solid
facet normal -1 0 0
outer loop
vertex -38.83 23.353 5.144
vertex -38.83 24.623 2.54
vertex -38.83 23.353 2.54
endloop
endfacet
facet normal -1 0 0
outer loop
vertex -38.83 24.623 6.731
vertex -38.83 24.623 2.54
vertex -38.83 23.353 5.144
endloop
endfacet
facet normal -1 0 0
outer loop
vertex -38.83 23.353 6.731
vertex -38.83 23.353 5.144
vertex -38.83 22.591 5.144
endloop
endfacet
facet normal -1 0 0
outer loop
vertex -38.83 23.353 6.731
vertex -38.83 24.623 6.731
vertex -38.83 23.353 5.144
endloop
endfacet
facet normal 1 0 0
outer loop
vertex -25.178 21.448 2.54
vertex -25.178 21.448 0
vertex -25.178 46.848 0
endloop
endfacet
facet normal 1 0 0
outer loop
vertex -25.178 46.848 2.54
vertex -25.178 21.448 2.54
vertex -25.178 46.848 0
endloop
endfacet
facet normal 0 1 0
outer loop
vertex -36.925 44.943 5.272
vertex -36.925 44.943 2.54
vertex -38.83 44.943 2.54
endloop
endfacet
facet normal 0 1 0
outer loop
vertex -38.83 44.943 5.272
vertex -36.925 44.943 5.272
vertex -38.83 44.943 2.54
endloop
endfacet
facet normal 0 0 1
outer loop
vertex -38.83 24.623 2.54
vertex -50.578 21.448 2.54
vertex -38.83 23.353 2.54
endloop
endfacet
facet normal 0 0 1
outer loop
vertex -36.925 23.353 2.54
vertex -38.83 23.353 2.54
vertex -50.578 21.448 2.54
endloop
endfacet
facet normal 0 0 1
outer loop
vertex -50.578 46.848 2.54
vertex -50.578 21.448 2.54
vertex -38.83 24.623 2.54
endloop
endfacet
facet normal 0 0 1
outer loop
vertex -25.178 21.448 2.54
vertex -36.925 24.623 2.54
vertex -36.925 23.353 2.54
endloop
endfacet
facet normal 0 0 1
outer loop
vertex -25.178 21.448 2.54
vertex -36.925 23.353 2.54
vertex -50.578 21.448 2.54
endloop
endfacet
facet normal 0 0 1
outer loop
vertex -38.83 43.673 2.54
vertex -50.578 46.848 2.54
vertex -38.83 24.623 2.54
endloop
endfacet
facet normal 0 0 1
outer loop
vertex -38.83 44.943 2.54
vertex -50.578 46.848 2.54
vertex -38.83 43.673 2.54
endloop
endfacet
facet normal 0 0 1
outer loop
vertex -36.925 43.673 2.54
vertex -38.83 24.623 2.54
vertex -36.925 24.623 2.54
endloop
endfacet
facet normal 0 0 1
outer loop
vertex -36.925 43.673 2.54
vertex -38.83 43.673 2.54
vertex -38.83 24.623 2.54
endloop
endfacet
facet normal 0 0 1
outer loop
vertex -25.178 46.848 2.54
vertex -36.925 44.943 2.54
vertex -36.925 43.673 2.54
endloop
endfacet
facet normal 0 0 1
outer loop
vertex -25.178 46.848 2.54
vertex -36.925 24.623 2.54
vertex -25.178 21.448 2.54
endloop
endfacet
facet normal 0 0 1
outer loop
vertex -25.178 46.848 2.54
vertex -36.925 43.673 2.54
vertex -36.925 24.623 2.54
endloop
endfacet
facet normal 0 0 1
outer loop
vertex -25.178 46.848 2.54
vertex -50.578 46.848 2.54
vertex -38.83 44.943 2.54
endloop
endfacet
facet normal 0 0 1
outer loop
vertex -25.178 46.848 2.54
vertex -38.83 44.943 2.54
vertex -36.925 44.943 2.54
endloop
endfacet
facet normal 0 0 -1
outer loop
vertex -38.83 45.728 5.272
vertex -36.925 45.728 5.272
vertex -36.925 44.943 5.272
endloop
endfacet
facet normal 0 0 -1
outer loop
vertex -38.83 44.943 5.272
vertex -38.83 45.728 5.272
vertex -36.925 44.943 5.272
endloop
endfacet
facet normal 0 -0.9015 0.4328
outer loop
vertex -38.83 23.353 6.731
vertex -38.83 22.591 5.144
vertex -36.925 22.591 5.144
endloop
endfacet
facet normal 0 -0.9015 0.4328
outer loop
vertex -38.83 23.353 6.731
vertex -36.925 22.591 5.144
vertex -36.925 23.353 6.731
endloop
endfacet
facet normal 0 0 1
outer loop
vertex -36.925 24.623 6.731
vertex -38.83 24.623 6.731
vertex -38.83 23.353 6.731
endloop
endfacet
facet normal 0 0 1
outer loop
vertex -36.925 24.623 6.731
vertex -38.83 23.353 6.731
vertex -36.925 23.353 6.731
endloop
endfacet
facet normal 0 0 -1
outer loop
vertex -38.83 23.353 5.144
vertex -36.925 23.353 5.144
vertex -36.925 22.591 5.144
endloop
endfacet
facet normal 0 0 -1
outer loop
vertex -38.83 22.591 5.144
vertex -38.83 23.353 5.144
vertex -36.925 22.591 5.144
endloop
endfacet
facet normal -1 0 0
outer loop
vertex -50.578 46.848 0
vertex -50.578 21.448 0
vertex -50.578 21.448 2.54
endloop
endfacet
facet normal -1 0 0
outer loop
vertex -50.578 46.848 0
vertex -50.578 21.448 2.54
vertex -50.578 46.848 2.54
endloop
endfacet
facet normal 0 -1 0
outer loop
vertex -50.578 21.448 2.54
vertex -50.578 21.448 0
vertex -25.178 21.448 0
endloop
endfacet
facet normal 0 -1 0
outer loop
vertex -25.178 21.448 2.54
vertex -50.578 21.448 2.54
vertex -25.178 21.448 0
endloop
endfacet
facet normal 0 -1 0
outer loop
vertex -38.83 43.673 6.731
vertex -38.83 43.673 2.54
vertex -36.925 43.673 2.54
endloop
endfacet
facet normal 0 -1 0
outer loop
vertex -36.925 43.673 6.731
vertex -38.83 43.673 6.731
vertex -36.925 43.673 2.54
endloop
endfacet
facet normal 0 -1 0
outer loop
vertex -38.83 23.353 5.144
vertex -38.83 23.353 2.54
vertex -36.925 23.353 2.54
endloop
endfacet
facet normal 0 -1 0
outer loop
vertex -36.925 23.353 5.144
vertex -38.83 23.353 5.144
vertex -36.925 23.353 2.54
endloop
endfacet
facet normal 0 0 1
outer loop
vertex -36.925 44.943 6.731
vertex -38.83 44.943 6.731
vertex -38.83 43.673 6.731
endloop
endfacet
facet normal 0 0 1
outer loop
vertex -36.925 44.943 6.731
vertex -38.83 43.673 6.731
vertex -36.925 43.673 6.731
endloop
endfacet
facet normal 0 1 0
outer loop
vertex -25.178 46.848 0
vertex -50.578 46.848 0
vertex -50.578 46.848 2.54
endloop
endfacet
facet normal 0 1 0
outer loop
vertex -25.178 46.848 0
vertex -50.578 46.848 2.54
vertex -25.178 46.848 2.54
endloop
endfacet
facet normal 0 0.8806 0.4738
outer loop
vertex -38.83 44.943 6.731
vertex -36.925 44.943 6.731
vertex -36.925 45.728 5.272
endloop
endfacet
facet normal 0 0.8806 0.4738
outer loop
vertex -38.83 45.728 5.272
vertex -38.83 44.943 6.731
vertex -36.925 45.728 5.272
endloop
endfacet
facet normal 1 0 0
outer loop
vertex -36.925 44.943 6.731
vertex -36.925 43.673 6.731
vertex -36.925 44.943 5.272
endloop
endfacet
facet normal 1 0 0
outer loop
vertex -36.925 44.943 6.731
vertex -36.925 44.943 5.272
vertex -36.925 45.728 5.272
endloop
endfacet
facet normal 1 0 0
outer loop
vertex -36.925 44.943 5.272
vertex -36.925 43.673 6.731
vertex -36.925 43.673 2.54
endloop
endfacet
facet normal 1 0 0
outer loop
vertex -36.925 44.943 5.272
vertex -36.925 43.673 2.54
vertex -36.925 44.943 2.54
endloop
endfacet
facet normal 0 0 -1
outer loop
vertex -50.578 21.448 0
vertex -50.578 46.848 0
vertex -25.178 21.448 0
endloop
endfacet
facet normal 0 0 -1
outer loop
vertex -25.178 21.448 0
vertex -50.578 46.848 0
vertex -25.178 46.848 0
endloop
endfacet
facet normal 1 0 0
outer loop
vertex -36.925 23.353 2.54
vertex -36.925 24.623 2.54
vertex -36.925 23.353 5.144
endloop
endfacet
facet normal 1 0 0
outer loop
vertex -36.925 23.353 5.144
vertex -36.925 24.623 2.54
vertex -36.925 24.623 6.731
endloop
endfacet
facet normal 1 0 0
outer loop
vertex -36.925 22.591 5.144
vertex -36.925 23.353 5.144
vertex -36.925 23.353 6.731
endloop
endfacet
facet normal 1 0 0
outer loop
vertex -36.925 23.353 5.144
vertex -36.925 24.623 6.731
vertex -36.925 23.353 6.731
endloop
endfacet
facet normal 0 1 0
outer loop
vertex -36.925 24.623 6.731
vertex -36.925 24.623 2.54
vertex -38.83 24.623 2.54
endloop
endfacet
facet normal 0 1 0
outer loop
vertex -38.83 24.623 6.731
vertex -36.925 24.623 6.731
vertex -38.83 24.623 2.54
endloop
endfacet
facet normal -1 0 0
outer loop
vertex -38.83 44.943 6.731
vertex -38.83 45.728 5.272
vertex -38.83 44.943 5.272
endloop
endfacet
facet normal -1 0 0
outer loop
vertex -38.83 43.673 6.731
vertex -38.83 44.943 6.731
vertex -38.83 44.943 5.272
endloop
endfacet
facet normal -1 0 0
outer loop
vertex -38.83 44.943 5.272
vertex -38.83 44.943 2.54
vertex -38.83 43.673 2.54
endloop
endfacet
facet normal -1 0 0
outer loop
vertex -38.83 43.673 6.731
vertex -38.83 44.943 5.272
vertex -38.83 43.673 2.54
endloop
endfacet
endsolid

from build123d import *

# Parameters (mm, degrees)
F0_W     = 25.4
F0_H     = 25.4
F1_DEPTH = 2.54
F3_DEPTH = 4.191
F4_DEPTH = 4.191
F7_DEPTH = 1.905


with BuildPart() as f1:
    # F0 (on Top) → F1 (new body)
    with BuildSketch(Plane.XY):
        with Locations((-37.877972, 34.147903)):
            Rectangle(F0_W, F0_H)
    extrude(amount=F1_DEPTH)

    # F2 (on face) → F3 (join)
    with BuildSketch(Plane.XY.offset(2.54)):
        Polygon((-38.830472, 24.622903), (-38.830472, 24.036821), (-38.830472, 23.352903), (-37.877972, 23.352903), (-36.925472, 23.352903), (-36.925472, 24.622903), align=None)
    extrude(amount=F3_DEPTH)

    # F2 (on face) → F4 (join)
    with BuildSketch(Plane.XY.offset(2.54)):
        Polygon((-36.925472, 44.942903), (-37.877972, 44.942903), (-38.830472, 44.942903), (-38.830472, 44.307903), (-38.830472, 43.672903), (-36.925472, 43.672903), align=None)
    extrude(amount=F4_DEPTH)

    # F6 (on face) + F5 (on face) → F7 (join)
    with BuildSketch(Plane(origin=(-38.830472, 0, 0), x_dir=(0, -1, 0), z_dir=(-1, 0, 0))):
        Polygon((-23.352903, 6.731), (-23.352903, 5.1435), (-22.590903, 5.1435), align=None)
    with BuildSketch(Plane(origin=(-38.830472, 0, 0), x_dir=(0, -1, 0), z_dir=(-1, 0, 0))):
        Polygon((-45.728009, 5.272041), (-44.942903, 5.272041), (-44.942903, 6.731), align=None)
    extrude(amount=-F7_DEPTH)


solid = f1.part
